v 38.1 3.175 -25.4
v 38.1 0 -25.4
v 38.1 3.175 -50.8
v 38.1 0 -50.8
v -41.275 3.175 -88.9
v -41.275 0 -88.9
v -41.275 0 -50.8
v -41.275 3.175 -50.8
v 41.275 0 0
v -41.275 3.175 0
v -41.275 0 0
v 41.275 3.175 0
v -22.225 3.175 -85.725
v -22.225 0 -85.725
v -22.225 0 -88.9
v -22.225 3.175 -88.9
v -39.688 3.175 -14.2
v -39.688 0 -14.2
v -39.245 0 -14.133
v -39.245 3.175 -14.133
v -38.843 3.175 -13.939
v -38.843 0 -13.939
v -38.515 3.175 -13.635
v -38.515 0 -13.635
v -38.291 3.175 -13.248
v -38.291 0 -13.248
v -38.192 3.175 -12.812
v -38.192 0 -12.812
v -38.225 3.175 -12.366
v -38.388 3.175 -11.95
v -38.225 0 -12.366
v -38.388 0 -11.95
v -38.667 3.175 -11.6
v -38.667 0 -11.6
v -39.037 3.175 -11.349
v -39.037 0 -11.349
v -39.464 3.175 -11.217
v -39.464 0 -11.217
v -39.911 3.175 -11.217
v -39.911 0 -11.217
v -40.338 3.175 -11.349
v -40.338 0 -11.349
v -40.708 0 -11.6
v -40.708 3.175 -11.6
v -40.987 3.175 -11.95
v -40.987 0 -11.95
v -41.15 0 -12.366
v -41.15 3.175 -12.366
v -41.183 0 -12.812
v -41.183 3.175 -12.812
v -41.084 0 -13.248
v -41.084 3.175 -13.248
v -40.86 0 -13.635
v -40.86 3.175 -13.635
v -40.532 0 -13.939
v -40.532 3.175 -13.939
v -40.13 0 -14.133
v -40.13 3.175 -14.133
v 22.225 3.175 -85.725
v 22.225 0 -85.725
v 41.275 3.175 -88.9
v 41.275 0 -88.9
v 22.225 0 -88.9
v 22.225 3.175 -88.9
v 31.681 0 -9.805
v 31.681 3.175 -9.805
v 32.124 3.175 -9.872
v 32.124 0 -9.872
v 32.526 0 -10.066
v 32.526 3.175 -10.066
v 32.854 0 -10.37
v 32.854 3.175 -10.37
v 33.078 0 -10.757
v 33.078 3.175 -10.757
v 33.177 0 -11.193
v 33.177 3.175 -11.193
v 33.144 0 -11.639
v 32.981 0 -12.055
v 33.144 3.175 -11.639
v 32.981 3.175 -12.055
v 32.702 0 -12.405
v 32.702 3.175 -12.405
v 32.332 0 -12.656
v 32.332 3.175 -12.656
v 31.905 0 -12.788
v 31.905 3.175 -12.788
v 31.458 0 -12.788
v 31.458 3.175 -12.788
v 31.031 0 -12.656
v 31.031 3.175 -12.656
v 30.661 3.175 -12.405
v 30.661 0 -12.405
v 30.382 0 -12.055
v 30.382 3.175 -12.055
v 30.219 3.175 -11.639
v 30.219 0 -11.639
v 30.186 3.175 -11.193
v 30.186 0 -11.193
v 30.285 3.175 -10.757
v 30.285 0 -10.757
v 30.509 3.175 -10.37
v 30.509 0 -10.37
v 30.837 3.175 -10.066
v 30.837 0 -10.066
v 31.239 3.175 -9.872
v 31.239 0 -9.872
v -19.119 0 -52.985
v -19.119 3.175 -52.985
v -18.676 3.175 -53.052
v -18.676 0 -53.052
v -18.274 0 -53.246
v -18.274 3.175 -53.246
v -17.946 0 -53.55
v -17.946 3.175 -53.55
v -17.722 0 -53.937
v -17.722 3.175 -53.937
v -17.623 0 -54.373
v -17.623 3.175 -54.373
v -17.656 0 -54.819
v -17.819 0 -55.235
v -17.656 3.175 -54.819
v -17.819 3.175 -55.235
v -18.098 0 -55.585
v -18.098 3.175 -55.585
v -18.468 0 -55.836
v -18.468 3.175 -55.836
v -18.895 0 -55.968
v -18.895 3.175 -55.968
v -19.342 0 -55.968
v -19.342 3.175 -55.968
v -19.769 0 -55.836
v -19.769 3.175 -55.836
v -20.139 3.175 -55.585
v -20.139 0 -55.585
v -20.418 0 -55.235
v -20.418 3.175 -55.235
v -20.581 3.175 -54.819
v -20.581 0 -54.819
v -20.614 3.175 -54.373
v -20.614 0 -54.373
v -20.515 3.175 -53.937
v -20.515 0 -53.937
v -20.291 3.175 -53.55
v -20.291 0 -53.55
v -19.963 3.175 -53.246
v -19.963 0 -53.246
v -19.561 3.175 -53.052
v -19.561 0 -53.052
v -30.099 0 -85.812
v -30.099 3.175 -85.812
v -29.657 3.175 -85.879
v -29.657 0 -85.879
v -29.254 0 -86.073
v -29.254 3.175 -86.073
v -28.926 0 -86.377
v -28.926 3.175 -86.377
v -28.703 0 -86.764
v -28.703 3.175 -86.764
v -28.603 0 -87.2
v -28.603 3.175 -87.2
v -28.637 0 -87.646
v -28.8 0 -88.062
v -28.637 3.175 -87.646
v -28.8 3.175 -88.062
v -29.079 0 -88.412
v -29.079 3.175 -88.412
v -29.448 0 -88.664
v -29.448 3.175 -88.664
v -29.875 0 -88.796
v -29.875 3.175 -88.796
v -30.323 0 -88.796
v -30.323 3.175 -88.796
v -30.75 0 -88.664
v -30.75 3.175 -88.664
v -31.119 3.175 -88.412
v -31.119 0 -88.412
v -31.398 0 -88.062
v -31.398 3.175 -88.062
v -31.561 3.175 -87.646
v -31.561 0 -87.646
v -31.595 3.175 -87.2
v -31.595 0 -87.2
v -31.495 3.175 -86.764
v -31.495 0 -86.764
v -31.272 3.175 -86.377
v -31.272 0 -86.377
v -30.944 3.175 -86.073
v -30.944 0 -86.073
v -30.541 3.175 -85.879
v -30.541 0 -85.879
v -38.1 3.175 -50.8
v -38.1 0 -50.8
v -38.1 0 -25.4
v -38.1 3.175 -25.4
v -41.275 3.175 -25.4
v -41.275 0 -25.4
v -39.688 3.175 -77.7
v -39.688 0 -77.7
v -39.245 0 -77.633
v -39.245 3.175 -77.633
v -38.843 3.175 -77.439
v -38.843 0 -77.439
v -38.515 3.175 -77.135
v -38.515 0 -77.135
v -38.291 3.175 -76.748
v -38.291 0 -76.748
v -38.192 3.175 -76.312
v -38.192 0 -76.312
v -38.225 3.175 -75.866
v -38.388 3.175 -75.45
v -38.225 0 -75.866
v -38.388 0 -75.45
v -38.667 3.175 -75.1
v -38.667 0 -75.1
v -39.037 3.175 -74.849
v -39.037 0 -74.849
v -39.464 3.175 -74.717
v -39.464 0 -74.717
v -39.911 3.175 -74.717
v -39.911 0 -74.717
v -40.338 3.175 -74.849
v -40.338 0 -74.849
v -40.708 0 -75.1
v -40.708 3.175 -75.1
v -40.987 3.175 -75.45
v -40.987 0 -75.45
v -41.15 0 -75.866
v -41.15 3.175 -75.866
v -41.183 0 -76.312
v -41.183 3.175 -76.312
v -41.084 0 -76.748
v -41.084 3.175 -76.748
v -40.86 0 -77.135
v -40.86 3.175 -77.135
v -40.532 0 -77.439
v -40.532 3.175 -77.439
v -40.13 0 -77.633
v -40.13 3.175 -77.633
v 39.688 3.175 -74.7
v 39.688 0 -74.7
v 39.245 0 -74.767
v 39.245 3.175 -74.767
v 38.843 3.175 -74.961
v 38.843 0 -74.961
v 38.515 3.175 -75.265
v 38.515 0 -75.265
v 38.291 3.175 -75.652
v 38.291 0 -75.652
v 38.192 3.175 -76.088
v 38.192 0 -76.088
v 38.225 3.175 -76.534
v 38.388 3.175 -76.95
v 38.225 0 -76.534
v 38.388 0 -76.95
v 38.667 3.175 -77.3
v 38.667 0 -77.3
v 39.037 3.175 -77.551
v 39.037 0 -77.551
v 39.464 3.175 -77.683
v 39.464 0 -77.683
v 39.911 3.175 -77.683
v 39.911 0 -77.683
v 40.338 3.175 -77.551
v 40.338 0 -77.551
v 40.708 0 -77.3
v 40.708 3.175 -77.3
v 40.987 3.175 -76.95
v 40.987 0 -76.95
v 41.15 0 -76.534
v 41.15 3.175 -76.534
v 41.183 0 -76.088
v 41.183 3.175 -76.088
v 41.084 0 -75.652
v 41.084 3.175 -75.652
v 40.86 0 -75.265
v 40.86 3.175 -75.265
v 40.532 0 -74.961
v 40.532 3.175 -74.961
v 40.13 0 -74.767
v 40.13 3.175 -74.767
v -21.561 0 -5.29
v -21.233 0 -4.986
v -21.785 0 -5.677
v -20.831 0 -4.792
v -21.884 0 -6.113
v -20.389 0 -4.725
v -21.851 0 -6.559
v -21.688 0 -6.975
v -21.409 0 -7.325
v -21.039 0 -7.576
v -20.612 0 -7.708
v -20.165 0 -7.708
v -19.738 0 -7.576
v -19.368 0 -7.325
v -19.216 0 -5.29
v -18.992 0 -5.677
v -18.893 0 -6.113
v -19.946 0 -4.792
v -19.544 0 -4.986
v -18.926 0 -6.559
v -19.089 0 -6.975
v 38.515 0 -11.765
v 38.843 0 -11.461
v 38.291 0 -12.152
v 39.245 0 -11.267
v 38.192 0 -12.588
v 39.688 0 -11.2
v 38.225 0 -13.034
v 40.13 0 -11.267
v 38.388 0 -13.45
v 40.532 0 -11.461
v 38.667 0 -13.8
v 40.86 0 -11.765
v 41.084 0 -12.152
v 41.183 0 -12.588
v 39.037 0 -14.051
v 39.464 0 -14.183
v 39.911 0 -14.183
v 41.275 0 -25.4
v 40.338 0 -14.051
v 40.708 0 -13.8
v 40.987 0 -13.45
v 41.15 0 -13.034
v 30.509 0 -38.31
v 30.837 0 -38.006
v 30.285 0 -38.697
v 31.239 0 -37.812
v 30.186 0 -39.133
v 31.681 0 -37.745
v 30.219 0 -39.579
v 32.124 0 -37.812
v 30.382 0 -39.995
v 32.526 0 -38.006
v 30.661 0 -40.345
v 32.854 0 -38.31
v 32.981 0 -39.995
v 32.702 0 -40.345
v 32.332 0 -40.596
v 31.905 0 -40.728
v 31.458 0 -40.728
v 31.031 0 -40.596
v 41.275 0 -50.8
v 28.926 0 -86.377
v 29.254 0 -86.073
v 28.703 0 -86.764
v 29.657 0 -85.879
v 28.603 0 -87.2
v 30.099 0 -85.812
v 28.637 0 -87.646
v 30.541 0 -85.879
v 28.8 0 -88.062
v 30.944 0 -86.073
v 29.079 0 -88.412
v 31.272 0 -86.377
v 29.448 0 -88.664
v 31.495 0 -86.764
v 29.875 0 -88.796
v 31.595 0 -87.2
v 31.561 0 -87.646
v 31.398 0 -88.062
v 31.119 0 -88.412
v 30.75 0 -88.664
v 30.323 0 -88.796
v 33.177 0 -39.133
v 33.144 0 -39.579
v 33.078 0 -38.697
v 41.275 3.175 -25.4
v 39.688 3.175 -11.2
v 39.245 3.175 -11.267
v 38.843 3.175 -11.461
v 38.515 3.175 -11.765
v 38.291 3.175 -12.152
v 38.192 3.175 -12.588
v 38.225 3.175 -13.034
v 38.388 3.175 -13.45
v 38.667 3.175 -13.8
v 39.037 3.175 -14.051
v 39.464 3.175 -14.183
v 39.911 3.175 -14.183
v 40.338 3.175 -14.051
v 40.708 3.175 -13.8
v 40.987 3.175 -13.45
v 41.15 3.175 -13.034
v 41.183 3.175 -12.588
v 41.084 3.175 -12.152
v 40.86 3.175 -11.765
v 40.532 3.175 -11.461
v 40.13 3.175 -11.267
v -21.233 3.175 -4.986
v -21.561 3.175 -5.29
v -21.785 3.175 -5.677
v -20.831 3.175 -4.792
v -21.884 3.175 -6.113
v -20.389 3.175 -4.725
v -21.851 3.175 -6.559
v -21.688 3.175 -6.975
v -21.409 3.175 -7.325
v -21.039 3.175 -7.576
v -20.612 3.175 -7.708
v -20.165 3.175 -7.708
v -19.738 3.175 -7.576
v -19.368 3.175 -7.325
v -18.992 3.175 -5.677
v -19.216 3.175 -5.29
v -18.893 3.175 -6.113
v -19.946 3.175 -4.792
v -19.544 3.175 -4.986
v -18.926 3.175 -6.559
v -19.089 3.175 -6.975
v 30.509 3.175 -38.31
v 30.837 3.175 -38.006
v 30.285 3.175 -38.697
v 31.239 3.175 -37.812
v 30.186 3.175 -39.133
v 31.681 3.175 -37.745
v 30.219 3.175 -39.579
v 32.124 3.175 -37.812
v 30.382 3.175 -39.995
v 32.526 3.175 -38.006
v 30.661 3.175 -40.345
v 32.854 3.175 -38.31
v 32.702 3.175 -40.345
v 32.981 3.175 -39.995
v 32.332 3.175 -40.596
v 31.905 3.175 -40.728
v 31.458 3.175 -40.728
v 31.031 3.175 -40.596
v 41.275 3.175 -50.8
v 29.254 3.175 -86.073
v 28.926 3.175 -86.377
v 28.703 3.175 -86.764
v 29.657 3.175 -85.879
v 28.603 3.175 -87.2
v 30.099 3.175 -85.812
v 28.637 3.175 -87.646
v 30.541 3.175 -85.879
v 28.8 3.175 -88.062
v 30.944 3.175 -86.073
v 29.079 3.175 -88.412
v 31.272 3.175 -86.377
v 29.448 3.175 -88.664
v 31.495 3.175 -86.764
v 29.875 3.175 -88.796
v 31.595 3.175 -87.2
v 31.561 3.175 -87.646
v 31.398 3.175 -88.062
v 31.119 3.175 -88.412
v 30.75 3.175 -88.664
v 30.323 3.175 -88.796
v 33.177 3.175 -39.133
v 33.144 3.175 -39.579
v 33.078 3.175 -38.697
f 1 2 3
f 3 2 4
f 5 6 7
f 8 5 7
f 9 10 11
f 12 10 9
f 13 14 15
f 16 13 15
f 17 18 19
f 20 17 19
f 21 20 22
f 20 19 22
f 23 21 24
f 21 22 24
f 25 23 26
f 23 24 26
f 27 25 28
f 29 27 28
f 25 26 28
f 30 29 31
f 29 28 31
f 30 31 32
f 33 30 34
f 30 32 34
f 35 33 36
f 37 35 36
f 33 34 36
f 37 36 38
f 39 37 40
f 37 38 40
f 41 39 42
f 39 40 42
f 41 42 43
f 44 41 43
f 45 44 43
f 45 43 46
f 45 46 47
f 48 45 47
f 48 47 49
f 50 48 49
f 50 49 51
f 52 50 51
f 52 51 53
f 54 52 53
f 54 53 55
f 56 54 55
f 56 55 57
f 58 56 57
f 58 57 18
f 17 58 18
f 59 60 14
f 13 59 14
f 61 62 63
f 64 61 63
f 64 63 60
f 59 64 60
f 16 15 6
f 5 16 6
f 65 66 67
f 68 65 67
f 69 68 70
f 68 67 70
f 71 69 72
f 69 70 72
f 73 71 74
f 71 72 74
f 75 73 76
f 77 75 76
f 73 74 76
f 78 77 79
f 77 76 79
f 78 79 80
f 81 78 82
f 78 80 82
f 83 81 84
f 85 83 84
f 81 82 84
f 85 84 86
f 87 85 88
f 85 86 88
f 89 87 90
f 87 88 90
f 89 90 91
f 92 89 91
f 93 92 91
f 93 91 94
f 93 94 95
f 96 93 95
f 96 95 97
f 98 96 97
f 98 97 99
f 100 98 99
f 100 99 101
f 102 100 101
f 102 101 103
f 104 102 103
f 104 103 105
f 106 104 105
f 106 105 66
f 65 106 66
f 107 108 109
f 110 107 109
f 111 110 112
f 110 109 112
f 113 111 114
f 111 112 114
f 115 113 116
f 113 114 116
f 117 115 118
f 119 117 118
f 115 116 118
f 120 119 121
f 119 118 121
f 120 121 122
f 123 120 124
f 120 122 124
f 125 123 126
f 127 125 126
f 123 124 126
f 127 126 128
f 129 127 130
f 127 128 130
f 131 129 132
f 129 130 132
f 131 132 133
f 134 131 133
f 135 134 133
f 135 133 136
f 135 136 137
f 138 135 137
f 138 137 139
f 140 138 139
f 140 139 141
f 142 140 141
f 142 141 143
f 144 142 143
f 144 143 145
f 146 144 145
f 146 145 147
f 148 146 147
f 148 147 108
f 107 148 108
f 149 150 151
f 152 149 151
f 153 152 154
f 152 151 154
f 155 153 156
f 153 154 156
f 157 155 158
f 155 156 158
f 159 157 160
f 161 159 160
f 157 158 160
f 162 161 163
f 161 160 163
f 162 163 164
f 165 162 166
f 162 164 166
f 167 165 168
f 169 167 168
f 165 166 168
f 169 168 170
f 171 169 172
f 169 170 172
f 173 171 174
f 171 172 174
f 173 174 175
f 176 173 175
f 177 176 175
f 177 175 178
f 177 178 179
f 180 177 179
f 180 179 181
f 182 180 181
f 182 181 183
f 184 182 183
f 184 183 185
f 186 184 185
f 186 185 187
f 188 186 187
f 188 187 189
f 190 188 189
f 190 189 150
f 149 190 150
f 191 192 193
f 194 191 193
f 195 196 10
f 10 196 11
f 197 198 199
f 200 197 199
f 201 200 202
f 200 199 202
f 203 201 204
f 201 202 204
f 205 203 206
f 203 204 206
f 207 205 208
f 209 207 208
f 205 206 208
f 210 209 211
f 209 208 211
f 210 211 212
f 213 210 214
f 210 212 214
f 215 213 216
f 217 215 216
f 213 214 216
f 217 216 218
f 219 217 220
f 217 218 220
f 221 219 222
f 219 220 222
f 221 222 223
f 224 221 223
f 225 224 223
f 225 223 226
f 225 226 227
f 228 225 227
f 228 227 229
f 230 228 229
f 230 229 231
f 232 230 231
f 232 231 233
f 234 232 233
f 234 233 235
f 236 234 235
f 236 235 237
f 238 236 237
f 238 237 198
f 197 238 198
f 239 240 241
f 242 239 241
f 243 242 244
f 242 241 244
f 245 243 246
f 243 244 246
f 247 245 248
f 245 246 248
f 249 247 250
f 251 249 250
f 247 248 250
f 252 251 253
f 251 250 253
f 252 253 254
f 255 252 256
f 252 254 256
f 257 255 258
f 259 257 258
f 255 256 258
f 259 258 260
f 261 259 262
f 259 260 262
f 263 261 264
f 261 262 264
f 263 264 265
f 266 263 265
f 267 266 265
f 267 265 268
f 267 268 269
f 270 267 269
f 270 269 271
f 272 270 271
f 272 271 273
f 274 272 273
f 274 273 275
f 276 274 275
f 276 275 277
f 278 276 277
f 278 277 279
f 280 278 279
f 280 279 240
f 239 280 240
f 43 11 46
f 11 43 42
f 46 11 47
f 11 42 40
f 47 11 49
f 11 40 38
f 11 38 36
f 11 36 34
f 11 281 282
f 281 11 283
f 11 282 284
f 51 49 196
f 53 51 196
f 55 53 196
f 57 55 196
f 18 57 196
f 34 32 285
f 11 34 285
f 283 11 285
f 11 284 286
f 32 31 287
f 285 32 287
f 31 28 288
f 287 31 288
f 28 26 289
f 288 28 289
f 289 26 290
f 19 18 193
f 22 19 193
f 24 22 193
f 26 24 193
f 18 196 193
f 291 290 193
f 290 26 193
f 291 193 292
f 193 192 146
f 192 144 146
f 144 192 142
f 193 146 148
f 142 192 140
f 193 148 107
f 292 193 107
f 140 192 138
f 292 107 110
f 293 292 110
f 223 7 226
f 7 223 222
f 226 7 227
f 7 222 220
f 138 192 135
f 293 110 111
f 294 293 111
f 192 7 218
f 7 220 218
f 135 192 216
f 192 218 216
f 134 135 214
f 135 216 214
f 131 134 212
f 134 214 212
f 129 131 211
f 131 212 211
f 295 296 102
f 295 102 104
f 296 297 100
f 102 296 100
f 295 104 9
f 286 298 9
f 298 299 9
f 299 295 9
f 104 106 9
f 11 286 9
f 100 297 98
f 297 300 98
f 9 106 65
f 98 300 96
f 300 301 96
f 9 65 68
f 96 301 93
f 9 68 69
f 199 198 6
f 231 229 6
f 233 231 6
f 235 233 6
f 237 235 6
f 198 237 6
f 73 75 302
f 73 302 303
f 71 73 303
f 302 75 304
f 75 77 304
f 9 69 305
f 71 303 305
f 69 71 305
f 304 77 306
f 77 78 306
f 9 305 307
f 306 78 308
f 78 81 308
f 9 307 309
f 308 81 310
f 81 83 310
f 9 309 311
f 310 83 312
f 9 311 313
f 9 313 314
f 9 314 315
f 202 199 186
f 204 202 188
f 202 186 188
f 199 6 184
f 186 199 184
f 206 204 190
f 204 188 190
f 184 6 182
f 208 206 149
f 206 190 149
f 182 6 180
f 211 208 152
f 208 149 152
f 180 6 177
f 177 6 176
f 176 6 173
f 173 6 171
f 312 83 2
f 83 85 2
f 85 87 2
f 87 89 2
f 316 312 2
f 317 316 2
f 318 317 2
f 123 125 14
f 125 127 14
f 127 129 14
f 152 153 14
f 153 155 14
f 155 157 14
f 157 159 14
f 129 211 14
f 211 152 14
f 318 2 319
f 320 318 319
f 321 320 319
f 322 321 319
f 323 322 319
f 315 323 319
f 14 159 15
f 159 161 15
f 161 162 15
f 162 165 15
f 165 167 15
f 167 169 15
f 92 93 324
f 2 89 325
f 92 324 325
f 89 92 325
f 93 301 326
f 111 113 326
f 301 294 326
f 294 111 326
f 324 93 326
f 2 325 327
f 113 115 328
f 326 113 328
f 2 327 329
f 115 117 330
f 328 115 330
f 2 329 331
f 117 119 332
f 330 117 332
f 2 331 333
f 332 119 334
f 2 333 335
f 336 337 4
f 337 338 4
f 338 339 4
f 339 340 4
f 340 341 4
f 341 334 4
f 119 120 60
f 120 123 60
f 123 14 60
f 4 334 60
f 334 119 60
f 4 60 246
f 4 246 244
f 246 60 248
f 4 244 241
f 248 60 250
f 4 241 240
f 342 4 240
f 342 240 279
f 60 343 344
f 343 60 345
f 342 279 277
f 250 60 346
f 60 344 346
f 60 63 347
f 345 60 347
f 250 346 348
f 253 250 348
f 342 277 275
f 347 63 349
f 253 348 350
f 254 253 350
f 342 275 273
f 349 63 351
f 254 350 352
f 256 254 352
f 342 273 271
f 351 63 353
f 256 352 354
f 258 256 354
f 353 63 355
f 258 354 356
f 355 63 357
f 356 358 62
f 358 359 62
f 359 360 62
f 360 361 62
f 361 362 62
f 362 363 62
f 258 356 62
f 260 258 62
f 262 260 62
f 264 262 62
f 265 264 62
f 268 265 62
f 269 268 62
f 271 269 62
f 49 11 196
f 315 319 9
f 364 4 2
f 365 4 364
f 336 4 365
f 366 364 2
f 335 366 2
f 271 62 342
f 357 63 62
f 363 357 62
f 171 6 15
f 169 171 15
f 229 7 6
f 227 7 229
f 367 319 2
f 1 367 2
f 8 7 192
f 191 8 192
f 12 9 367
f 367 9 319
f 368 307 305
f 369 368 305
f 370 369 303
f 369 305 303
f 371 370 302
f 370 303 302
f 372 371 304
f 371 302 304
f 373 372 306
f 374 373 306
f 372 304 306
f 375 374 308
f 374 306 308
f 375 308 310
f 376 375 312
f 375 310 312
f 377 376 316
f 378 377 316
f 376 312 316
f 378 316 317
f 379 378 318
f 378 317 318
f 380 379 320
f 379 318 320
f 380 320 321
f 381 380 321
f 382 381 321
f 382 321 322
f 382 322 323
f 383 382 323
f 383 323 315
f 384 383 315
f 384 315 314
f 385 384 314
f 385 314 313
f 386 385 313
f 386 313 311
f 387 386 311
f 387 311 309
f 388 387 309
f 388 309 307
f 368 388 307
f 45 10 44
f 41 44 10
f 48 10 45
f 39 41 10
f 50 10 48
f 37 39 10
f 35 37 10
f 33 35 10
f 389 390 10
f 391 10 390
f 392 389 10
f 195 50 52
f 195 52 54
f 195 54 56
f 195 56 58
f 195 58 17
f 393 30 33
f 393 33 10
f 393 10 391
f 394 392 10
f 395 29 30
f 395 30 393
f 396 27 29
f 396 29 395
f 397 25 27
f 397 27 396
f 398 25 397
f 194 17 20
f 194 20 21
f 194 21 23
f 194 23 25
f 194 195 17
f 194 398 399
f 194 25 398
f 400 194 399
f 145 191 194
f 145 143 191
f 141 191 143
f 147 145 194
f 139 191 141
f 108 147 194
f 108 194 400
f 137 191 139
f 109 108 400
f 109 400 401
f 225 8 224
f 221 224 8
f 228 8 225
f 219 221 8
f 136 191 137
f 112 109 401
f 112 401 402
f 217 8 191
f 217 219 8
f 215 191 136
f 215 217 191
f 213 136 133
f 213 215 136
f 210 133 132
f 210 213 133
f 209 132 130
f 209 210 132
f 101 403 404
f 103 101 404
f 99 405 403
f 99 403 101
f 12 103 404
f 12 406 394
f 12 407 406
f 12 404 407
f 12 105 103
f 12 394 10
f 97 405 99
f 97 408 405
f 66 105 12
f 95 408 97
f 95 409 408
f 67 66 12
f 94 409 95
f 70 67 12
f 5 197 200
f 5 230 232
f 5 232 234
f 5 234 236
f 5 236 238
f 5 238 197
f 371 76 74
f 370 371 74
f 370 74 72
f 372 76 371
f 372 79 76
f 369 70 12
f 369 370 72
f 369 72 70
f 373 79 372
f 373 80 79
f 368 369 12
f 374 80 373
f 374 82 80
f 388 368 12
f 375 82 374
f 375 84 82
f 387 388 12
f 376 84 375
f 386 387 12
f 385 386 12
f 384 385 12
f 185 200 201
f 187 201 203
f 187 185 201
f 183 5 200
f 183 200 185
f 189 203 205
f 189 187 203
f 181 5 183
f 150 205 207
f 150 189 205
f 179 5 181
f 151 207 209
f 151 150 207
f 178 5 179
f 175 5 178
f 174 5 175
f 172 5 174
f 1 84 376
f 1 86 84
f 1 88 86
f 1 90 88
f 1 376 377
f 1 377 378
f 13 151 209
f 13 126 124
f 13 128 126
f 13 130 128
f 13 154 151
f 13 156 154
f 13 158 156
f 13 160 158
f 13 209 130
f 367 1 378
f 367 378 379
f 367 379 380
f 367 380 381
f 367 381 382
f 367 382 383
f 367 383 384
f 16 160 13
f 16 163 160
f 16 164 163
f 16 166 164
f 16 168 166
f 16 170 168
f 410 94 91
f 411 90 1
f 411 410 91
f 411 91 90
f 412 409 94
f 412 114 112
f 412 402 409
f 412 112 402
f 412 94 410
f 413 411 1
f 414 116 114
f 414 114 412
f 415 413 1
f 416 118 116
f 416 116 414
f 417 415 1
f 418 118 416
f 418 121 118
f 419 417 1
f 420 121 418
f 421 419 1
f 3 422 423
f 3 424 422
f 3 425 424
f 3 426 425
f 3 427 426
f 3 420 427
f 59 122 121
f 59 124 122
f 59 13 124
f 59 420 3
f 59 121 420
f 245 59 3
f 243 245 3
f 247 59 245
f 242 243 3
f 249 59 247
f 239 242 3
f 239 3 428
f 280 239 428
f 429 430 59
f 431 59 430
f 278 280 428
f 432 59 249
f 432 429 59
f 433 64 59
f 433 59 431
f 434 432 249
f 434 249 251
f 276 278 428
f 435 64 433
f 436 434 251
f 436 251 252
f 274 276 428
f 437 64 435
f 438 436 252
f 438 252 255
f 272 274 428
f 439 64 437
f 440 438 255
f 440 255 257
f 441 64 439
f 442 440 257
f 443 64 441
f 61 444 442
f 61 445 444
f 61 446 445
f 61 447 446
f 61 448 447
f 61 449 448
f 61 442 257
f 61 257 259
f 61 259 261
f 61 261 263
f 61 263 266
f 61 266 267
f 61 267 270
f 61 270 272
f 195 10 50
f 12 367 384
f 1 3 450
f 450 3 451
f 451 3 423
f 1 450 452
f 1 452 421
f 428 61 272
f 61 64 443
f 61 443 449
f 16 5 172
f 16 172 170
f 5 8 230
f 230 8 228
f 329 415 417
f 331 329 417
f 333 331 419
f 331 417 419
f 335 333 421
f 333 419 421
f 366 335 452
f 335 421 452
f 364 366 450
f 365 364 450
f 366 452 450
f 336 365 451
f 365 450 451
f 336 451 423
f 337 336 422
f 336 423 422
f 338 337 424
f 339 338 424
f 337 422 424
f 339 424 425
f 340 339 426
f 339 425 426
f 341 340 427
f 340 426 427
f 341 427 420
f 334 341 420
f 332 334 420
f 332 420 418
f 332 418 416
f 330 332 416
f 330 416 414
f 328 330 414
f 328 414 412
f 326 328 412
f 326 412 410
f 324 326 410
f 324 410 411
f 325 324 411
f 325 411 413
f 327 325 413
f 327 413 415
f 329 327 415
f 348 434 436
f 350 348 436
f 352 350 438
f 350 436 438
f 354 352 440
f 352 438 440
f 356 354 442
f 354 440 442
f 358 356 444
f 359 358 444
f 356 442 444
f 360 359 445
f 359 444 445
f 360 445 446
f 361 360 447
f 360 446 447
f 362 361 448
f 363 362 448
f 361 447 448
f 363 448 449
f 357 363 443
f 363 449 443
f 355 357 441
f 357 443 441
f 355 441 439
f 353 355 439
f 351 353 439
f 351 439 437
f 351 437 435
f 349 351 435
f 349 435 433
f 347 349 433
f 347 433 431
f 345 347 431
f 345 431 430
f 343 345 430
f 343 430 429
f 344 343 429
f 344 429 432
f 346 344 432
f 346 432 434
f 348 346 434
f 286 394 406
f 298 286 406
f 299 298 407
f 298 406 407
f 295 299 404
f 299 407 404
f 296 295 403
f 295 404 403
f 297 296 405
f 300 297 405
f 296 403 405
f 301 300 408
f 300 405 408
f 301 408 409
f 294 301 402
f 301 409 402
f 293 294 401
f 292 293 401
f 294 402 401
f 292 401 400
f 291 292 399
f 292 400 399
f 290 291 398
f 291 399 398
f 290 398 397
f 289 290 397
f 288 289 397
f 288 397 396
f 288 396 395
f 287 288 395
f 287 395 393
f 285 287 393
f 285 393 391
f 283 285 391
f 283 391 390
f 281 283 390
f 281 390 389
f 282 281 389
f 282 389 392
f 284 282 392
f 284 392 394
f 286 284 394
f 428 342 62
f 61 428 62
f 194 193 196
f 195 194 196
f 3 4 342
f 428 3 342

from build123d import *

# Parameters (mm, degrees)
BOSS_EXTRUDE1_DEPTH = 3.175
SKETCH2_R           = 1.5
SKETCH2_R_2         = 1.500000048
CUT_EXTRUDE1_DEPTH  = 99.065877093
SKETCH4_R           = 1.5
CUT_EXTRUDE3_DEPTH  = 99.065877093
SKETCH5_W           = 82.55
SKETCH5_H           = 60.325
CUT_EXTRUDE4_DEPTH  = 99.065877093
SKETCH6_R           = 1.5
CUT_EXTRUDE5_DEPTH  = 99.065877093


with BuildPart() as part:
    # Sketch1 → Boss-Extrude1 (new body)
    with BuildSketch(Plane(origin=(0, 0, 0), x_dir=(1, 0, 0), z_dir=(0, 1, 0))):
        Polygon((-41.275, 0), (-36.368301991, -11.713851401), (-33.466950324, -10.424361771), (-17.857958519, -45.544593333), (-20.759310186, -46.834082962), (-15.601351667, -58.43948963), (-12.7, -60.325), (-5.08, -60.325), (-5.08, -57.15), (5.08, -57.15), (5.08, -60.325), (12.7, -60.325), (15.601351667, -58.43948963), (20.759310186, -46.834082962), (17.857958519, -45.544593333), (33.466950324, -10.424361771), (36.368301991, -11.713851401), (41.275, 0), (41.275, 25.4), (38.1, 25.4), (38.1, 50.8), (41.275, 50.8), (41.275, 88.9), (22.225, 88.9), (22.225, 85.725), (10.205057544, 85.725), (-10.205057544, 85.725), (-22.225, 85.725), (-22.225, 88.9), (-41.275, 88.9), (-41.275, 50.8), (-38.1, 50.8), (-38.1, 25.4), (-41.275, 25.4), align=None)
    extrude(amount=BOSS_EXTRUDE1_DEPTH)

    # Sketch2 → Cut-Extrude1 (cut, through all)
    with BuildSketch(Plane(origin=(0, 0, 0), x_dir=(-1, 0, 0), z_dir=(0, -1, 0))):
        with Locations(Location((39.6875, 76.2, 0), (0, 0, 90))):
            Circle(SKETCH2_R)
        with Locations(Location((-8.89, -58.7375, 0), (0, 0, 270))):
            Circle(SKETCH2_R_2)
        with Locations(Location((39.6875, 12.7, 0), (0, 0, 90))):
            Circle(SKETCH2_R_2)
        with Locations((37.496605417, -5.266403252)):
            Circle(SKETCH2_R_2)
        with Locations(Location((16.729655093, -51.992041481, 0), (0, 0, 90))):
            Circle(SKETCH2_R_2)
        with Locations(Location((8.89, -58.7375, 0), (0, 0, 90))):
            Circle(SKETCH2_R_2)
        with Locations(Location((-16.729655093, -51.992041481, 0), (0, 0, 270))):
            Circle(SKETCH2_R_2)
        with Locations((-37.496605417, -5.266403252)):
            Circle(SKETCH2_R_2)
        with Locations(Location((-39.6875, 12.7, 0), (0, 0, 270))):
            Circle(SKETCH2_R_2)
        with Locations(Location((-39.6875, 76.2, 0), (0, 0, 270))):
            Circle(SKETCH2_R)
    extrude(amount=-CUT_EXTRUDE1_DEPTH, mode=Mode.SUBTRACT)

    # Sketch4 → Cut-Extrude3 (cut, through all)
    with BuildSketch(Plane(origin=(0, 3.175, 0), x_dir=(1, 0, 0), z_dir=(0, 1, 0))):
        with Locations(Location((31.681488655, 11.305, 0), (0, 0, 270))):
            Circle(SKETCH4_R)
        with Locations(Location((31.681488655, 39.245, 0), (0, 0, 270))):
            Circle(SKETCH4_R)
        with Locations(Location((-20.388511345, 6.225, 0), (0, 0, 270))):
            Circle(SKETCH4_R)
        with Locations(Location((-19.118511345, 54.485, 0), (0, 0, 270))):
            Circle(SKETCH4_R)
    extrude(amount=-CUT_EXTRUDE3_DEPTH, mode=Mode.SUBTRACT)

    # Sketch5 → Cut-Extrude4 (cut, through all)
    with BuildSketch(Plane(origin=(0, 3.175, 0), x_dir=(1, 0, 0), z_dir=(0, 1, 0))):
        with Locations((0, -30.1625)):
            Rectangle(SKETCH5_W, SKETCH5_H)
    extrude(amount=-CUT_EXTRUDE4_DEPTH, mode=Mode.SUBTRACT)

    # Sketch6 → Cut-Extrude5 (cut, through all)
    with BuildSketch(Plane(origin=(0, 3.175, 0), x_dir=(1, 0, 0), z_dir=(0, 1, 0))):
        with Locations(Location((-30.099, 87.3125, 0), (0, 0, 270))):
            Circle(SKETCH6_R)
        with Locations(Location((30.099, 87.3125, 0), (0, 0, 270))):
            Circle(SKETCH6_R)
    extrude(amount=-CUT_EXTRUDE5_DEPTH, mode=Mode.SUBTRACT)


solid = part.part
